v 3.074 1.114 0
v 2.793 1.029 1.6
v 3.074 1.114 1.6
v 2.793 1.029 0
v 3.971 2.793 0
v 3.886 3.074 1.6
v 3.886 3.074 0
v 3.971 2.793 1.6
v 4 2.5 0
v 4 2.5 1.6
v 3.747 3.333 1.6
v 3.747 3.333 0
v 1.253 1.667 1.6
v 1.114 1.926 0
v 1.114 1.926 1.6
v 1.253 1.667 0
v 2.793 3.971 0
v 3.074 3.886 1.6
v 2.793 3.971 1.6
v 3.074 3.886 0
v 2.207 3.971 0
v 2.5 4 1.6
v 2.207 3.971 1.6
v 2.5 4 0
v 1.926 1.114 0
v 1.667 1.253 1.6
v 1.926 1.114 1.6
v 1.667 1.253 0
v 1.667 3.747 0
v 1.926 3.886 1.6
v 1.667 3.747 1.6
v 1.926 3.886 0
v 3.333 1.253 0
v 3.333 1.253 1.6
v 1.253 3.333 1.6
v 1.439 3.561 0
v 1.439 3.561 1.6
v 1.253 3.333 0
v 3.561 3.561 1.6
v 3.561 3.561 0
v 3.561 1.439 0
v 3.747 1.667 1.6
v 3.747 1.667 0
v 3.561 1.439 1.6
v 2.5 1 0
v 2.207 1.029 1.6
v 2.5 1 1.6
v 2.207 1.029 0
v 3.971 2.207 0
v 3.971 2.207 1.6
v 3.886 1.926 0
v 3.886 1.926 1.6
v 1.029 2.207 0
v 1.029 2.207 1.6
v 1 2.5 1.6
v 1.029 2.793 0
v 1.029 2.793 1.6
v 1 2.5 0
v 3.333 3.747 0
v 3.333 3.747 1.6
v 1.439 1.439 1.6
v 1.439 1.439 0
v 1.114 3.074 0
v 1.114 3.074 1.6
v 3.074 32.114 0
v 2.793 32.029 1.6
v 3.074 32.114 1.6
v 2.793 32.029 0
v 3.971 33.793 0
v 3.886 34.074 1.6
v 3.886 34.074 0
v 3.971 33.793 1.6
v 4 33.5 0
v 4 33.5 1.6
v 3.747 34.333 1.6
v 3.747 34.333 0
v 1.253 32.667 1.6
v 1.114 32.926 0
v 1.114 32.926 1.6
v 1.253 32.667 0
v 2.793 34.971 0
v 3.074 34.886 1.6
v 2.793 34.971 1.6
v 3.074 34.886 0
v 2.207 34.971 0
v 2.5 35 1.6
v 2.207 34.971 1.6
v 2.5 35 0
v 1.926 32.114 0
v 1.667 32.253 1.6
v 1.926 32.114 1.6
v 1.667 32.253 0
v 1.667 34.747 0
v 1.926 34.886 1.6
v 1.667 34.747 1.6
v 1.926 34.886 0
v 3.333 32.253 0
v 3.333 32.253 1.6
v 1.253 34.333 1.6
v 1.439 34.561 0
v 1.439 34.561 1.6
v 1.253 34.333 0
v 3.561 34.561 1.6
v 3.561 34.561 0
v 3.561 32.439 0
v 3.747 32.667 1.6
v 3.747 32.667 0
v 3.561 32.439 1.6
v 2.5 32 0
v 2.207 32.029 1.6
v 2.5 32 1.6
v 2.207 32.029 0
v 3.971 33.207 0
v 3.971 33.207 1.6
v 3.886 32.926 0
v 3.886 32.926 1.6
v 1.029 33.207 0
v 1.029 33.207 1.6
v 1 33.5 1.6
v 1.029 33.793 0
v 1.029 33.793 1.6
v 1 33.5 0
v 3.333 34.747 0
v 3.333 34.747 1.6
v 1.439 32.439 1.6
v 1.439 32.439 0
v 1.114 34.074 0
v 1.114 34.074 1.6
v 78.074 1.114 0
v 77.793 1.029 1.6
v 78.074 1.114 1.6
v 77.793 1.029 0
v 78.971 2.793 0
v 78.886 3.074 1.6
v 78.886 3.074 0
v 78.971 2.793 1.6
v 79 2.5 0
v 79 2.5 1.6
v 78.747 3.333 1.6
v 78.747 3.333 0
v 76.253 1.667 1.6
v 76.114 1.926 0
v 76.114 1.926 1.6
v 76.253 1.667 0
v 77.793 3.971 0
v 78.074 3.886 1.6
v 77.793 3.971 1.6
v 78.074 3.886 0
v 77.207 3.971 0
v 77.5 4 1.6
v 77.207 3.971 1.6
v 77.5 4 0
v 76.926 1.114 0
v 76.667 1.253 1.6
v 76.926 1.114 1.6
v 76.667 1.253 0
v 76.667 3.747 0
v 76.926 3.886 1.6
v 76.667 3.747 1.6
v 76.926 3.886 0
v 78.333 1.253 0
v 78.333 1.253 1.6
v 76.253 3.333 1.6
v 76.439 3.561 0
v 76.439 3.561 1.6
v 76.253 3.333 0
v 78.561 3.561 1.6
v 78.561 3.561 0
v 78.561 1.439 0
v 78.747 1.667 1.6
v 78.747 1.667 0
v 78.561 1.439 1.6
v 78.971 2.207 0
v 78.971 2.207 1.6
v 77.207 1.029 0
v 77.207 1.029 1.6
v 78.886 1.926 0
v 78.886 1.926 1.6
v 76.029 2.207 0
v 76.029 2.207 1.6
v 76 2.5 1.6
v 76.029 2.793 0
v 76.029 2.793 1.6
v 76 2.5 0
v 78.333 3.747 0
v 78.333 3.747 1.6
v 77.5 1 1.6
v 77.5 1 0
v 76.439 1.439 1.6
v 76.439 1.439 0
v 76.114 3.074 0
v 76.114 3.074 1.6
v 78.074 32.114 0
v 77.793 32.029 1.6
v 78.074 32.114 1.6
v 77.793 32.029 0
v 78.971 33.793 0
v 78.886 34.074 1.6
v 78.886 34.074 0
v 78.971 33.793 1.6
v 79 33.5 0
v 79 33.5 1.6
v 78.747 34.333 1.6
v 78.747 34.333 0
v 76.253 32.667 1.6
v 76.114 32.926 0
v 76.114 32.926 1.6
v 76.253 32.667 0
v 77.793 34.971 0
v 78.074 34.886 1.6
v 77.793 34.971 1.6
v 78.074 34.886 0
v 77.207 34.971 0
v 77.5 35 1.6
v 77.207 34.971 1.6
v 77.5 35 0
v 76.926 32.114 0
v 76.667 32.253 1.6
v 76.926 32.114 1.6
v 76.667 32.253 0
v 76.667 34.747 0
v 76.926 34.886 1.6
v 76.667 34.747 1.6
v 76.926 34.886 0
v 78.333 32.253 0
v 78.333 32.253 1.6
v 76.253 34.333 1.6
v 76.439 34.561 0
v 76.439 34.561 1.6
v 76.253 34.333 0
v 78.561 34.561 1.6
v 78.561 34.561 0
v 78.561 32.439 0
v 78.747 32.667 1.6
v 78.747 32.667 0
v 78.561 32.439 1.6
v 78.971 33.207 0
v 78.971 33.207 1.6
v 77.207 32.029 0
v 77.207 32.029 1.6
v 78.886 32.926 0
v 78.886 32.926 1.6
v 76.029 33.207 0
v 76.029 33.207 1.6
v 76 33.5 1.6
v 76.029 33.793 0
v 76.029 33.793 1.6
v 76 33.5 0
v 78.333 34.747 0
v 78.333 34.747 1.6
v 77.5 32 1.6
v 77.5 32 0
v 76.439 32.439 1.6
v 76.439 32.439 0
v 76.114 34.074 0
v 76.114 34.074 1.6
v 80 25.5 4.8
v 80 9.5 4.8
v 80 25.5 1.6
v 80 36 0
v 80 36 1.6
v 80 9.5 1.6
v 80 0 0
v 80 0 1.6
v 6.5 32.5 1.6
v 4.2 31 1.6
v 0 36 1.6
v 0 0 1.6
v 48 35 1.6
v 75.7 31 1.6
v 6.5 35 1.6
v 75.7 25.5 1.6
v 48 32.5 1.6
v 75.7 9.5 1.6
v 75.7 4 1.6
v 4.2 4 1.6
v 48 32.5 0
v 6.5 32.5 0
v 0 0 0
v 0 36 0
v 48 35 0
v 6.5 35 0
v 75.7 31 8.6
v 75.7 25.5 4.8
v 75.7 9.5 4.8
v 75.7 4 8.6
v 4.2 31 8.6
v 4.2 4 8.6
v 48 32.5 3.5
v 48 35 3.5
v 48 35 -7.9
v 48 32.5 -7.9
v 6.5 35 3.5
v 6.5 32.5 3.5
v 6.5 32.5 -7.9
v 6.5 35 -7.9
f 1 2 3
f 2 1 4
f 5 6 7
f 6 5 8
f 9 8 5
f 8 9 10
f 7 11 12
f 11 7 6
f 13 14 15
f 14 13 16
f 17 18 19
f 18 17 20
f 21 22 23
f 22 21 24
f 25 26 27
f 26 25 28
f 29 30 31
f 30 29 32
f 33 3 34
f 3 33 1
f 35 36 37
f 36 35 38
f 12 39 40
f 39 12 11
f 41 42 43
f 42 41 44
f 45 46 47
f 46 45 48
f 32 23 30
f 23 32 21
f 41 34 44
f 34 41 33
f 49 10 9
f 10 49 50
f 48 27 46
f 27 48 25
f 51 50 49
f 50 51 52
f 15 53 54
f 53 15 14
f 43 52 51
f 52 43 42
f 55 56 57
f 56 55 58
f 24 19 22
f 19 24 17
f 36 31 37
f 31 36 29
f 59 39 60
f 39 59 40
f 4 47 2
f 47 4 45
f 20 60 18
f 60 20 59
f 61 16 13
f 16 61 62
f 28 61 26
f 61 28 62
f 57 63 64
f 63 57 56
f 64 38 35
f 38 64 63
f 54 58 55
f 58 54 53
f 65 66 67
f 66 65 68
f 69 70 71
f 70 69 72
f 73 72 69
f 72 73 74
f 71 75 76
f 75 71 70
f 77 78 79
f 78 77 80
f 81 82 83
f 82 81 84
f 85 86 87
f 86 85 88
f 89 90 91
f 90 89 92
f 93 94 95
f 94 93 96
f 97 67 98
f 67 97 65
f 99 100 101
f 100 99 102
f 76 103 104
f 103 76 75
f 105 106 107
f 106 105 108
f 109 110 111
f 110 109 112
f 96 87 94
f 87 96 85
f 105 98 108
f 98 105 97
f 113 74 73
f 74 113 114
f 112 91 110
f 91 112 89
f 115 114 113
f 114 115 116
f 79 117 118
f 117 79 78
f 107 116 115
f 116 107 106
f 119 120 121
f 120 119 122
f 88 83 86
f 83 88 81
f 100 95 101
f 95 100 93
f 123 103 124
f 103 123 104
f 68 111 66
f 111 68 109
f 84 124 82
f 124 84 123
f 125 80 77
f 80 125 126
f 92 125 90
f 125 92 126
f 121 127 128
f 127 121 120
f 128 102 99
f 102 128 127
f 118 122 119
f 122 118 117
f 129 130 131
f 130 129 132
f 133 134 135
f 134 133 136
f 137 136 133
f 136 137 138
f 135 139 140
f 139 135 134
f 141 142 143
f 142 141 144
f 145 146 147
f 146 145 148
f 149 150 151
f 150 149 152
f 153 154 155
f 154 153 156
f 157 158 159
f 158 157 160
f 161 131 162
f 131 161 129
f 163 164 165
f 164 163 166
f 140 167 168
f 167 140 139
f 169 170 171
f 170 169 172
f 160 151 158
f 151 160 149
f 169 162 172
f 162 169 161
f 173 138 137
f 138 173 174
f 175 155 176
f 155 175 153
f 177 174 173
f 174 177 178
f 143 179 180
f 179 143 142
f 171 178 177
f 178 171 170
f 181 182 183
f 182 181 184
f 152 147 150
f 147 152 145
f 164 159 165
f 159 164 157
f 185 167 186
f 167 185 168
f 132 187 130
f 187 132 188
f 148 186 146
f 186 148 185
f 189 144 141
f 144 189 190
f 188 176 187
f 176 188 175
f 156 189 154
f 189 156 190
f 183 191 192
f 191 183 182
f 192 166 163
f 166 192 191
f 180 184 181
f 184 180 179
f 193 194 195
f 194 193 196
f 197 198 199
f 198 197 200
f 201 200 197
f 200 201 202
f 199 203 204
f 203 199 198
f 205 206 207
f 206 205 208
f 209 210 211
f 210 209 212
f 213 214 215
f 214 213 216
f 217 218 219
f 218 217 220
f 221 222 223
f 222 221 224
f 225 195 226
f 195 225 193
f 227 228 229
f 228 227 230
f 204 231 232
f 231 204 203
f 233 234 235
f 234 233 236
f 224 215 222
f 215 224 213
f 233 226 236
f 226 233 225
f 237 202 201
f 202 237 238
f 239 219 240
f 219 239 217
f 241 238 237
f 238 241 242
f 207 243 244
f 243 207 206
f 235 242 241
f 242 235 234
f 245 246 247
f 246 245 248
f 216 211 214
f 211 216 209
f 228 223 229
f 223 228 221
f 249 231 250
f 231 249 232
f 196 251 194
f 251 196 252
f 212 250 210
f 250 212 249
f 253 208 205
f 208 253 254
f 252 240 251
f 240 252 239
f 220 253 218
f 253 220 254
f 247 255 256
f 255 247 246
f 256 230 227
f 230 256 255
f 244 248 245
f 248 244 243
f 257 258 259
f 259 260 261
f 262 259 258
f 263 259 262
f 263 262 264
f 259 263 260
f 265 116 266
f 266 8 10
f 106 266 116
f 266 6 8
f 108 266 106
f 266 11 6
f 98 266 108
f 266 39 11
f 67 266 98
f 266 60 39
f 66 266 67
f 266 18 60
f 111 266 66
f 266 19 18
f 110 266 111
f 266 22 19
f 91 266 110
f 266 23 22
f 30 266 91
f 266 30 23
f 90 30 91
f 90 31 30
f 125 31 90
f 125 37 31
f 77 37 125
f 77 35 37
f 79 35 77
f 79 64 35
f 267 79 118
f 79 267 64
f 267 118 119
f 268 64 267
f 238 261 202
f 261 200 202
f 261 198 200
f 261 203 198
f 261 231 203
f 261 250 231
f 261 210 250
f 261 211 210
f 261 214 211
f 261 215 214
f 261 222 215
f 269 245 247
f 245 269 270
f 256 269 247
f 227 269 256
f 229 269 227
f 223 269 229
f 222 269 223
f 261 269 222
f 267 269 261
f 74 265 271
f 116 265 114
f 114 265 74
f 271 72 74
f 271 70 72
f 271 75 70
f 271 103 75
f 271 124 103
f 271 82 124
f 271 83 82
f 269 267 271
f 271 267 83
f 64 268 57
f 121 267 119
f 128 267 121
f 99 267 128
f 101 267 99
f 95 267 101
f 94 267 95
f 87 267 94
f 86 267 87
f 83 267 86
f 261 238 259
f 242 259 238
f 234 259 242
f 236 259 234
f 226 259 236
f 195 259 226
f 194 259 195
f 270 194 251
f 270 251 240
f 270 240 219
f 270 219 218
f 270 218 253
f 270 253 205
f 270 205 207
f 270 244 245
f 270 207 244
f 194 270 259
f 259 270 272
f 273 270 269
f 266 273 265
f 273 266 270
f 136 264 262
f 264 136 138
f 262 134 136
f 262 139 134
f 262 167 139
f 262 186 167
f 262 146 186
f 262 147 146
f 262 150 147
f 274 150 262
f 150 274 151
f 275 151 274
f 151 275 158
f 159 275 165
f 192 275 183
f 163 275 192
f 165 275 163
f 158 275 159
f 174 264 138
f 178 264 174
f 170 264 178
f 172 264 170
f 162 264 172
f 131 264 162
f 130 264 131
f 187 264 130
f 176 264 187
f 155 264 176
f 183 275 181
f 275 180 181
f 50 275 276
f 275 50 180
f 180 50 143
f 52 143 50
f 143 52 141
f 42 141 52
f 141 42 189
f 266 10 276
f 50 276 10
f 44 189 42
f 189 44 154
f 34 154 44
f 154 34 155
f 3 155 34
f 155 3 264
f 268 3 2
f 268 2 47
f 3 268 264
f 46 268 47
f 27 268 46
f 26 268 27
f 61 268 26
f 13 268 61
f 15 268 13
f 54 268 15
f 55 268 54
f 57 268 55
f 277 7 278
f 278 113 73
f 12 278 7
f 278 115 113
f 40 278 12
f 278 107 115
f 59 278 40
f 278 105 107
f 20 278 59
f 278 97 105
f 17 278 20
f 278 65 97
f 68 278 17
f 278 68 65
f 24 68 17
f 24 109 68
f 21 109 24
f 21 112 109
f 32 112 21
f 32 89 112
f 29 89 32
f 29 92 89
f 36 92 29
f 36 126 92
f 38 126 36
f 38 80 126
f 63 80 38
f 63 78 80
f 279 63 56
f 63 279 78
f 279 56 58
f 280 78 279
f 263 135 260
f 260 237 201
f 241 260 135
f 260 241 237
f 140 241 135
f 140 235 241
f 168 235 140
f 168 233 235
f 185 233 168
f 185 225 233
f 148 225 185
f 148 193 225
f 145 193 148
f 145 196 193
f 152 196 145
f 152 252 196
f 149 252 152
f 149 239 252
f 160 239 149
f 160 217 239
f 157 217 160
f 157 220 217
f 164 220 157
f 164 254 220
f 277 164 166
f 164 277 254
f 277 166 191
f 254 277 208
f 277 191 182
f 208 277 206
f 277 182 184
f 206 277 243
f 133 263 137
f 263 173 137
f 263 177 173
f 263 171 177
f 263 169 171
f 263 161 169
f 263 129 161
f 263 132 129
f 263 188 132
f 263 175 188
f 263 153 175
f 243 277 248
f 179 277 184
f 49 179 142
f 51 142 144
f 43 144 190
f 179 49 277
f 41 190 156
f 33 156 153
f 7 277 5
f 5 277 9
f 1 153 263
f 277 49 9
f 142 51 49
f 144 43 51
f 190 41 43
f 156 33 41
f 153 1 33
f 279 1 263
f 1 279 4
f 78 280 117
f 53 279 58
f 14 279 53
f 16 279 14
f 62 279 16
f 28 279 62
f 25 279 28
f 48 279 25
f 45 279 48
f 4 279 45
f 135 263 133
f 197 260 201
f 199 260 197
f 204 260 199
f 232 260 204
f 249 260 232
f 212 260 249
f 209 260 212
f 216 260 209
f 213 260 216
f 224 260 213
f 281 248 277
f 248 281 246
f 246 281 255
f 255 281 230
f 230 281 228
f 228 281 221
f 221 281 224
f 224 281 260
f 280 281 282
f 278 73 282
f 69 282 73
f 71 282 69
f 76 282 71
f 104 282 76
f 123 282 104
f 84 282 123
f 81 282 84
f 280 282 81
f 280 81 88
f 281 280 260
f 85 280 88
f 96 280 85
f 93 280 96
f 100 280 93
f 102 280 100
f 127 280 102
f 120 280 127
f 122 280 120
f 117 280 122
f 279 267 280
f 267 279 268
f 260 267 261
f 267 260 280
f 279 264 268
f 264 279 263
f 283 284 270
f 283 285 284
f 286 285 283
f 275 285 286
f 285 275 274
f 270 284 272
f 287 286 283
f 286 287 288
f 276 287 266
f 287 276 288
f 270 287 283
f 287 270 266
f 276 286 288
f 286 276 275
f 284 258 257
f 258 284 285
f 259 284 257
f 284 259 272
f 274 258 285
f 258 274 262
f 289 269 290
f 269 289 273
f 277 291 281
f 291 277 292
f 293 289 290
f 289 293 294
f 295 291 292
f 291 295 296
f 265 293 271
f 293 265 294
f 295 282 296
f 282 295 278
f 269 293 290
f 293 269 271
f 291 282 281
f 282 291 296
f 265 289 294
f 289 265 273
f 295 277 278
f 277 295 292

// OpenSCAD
// file: lcd_vars.scad
/*
 *  "Planter" is a device that control a houseplant's water and light schedules.
 *  Copyright (C) 2018  Jon Sangster
 *
 *  This program is free software: you can redistribute it and/or modify it
 *  under the terms of the GNU General Public License as published by the Free
 *  Software Foundation, either version 3 of the License, or (at your option)
 *  any later version.
 *
 *  This program is distributed in the hope that it will be useful, but WITHOUT
 *  ANY WARRANTY; without even the implied warranty of MERCHANTABILITY or
 *  FITNESS FOR A PARTICULAR PURPOSE.  See the GNU General Public License for
 *  more details.
 *
 *  You should have received a copy of the GNU General Public License along
 *  with this program.  If not, see <https://www.gnu.org/licenses/>.
 */
lcd_x = 71.5;
lcd_y = 27;
lcd_z =  7;

lcd_off_x = 4.2;
lcd_off_y = 4;

lcd_pcb_x = 80;
lcd_pcb_y = 36;
lcd_pcb_z =  1.6;

lcd_hole_d   = 3;
lcd_hole_off = 1;

lcd_backlight_y = 16;
lcd_backlight_z =  4.8;
// main file
/*
 *  "Planter" is a device that control a houseplant's water and light schedules.
 *  Copyright (C) 2018  Jon Sangster
 *
 *  This program is free software: you can redistribute it and/or modify it
 *  under the terms of the GNU General Public License as published by the Free
 *  Software Foundation, either version 3 of the License, or (at your option)
 *  any later version.
 *
 *  This program is distributed in the hope that it will be useful, but WITHOUT
 *  ANY WARRANTY; without even the implied warranty of MERCHANTABILITY or
 *  FITNESS FOR A PARTICULAR PURPOSE.  See the GNU General Public License for
 *  more details.
 *
 *  You should have received a copy of the GNU General Public License along
 *  with this program.  If not, see <https://www.gnu.org/licenses/>.
 */
include <lcd_vars.scad>;

module lcd_holes()
{
    union() {
        for (x = [lcd_hole_d/2 + lcd_hole_off, lcd_pcb_x - lcd_hole_d/2 - lcd_hole_off]) {
            for (y = [lcd_hole_d/2 + lcd_hole_off, lcd_pcb_y - lcd_hole_d/2 - lcd_hole_off]) {
                translate([x, y, -2]) cylinder(d = lcd_hole_d, h= lcd_pcb_z + 4, $fn=32);
            }
        }
    }
}

module _lcd()
{
    difference() {
        color("OliveDrab") cube([lcd_pcb_x, lcd_pcb_y, lcd_pcb_z]);
        lcd_holes();
    }

    translate([lcd_off_x, lcd_off_y, lcd_pcb_z]) {
        color("LightSkyBlue") cube([lcd_x, lcd_y, lcd_z]);
    }


    translate([lcd_off_x + lcd_x - 1, lcd_off_y + (lcd_y - lcd_backlight_y)/2]) {
        color("Gainsboro") cube([lcd_pcb_x - (lcd_off_x + lcd_x) + 1, lcd_backlight_y, lcd_backlight_z]);
    }

    // Pins
    pins_x = 41.5;
    pins_y =  2.5;
    pins_z = 11.4;

    pins_off_x = 6.5;
    pins_off_y = lcd_pcb_y - 3.5;
    pins_off_z = 3.5 - pins_z;
    translate([pins_off_x, pins_off_y, pins_off_z]) {
        color("Gold") cube([pins_x, pins_y, pins_z]);
    }
}


module lcd(part = "positive")
{
    if (part == "negative") {
        lcd_holes();
    } else {
        _lcd();
    }
}

lcd();
